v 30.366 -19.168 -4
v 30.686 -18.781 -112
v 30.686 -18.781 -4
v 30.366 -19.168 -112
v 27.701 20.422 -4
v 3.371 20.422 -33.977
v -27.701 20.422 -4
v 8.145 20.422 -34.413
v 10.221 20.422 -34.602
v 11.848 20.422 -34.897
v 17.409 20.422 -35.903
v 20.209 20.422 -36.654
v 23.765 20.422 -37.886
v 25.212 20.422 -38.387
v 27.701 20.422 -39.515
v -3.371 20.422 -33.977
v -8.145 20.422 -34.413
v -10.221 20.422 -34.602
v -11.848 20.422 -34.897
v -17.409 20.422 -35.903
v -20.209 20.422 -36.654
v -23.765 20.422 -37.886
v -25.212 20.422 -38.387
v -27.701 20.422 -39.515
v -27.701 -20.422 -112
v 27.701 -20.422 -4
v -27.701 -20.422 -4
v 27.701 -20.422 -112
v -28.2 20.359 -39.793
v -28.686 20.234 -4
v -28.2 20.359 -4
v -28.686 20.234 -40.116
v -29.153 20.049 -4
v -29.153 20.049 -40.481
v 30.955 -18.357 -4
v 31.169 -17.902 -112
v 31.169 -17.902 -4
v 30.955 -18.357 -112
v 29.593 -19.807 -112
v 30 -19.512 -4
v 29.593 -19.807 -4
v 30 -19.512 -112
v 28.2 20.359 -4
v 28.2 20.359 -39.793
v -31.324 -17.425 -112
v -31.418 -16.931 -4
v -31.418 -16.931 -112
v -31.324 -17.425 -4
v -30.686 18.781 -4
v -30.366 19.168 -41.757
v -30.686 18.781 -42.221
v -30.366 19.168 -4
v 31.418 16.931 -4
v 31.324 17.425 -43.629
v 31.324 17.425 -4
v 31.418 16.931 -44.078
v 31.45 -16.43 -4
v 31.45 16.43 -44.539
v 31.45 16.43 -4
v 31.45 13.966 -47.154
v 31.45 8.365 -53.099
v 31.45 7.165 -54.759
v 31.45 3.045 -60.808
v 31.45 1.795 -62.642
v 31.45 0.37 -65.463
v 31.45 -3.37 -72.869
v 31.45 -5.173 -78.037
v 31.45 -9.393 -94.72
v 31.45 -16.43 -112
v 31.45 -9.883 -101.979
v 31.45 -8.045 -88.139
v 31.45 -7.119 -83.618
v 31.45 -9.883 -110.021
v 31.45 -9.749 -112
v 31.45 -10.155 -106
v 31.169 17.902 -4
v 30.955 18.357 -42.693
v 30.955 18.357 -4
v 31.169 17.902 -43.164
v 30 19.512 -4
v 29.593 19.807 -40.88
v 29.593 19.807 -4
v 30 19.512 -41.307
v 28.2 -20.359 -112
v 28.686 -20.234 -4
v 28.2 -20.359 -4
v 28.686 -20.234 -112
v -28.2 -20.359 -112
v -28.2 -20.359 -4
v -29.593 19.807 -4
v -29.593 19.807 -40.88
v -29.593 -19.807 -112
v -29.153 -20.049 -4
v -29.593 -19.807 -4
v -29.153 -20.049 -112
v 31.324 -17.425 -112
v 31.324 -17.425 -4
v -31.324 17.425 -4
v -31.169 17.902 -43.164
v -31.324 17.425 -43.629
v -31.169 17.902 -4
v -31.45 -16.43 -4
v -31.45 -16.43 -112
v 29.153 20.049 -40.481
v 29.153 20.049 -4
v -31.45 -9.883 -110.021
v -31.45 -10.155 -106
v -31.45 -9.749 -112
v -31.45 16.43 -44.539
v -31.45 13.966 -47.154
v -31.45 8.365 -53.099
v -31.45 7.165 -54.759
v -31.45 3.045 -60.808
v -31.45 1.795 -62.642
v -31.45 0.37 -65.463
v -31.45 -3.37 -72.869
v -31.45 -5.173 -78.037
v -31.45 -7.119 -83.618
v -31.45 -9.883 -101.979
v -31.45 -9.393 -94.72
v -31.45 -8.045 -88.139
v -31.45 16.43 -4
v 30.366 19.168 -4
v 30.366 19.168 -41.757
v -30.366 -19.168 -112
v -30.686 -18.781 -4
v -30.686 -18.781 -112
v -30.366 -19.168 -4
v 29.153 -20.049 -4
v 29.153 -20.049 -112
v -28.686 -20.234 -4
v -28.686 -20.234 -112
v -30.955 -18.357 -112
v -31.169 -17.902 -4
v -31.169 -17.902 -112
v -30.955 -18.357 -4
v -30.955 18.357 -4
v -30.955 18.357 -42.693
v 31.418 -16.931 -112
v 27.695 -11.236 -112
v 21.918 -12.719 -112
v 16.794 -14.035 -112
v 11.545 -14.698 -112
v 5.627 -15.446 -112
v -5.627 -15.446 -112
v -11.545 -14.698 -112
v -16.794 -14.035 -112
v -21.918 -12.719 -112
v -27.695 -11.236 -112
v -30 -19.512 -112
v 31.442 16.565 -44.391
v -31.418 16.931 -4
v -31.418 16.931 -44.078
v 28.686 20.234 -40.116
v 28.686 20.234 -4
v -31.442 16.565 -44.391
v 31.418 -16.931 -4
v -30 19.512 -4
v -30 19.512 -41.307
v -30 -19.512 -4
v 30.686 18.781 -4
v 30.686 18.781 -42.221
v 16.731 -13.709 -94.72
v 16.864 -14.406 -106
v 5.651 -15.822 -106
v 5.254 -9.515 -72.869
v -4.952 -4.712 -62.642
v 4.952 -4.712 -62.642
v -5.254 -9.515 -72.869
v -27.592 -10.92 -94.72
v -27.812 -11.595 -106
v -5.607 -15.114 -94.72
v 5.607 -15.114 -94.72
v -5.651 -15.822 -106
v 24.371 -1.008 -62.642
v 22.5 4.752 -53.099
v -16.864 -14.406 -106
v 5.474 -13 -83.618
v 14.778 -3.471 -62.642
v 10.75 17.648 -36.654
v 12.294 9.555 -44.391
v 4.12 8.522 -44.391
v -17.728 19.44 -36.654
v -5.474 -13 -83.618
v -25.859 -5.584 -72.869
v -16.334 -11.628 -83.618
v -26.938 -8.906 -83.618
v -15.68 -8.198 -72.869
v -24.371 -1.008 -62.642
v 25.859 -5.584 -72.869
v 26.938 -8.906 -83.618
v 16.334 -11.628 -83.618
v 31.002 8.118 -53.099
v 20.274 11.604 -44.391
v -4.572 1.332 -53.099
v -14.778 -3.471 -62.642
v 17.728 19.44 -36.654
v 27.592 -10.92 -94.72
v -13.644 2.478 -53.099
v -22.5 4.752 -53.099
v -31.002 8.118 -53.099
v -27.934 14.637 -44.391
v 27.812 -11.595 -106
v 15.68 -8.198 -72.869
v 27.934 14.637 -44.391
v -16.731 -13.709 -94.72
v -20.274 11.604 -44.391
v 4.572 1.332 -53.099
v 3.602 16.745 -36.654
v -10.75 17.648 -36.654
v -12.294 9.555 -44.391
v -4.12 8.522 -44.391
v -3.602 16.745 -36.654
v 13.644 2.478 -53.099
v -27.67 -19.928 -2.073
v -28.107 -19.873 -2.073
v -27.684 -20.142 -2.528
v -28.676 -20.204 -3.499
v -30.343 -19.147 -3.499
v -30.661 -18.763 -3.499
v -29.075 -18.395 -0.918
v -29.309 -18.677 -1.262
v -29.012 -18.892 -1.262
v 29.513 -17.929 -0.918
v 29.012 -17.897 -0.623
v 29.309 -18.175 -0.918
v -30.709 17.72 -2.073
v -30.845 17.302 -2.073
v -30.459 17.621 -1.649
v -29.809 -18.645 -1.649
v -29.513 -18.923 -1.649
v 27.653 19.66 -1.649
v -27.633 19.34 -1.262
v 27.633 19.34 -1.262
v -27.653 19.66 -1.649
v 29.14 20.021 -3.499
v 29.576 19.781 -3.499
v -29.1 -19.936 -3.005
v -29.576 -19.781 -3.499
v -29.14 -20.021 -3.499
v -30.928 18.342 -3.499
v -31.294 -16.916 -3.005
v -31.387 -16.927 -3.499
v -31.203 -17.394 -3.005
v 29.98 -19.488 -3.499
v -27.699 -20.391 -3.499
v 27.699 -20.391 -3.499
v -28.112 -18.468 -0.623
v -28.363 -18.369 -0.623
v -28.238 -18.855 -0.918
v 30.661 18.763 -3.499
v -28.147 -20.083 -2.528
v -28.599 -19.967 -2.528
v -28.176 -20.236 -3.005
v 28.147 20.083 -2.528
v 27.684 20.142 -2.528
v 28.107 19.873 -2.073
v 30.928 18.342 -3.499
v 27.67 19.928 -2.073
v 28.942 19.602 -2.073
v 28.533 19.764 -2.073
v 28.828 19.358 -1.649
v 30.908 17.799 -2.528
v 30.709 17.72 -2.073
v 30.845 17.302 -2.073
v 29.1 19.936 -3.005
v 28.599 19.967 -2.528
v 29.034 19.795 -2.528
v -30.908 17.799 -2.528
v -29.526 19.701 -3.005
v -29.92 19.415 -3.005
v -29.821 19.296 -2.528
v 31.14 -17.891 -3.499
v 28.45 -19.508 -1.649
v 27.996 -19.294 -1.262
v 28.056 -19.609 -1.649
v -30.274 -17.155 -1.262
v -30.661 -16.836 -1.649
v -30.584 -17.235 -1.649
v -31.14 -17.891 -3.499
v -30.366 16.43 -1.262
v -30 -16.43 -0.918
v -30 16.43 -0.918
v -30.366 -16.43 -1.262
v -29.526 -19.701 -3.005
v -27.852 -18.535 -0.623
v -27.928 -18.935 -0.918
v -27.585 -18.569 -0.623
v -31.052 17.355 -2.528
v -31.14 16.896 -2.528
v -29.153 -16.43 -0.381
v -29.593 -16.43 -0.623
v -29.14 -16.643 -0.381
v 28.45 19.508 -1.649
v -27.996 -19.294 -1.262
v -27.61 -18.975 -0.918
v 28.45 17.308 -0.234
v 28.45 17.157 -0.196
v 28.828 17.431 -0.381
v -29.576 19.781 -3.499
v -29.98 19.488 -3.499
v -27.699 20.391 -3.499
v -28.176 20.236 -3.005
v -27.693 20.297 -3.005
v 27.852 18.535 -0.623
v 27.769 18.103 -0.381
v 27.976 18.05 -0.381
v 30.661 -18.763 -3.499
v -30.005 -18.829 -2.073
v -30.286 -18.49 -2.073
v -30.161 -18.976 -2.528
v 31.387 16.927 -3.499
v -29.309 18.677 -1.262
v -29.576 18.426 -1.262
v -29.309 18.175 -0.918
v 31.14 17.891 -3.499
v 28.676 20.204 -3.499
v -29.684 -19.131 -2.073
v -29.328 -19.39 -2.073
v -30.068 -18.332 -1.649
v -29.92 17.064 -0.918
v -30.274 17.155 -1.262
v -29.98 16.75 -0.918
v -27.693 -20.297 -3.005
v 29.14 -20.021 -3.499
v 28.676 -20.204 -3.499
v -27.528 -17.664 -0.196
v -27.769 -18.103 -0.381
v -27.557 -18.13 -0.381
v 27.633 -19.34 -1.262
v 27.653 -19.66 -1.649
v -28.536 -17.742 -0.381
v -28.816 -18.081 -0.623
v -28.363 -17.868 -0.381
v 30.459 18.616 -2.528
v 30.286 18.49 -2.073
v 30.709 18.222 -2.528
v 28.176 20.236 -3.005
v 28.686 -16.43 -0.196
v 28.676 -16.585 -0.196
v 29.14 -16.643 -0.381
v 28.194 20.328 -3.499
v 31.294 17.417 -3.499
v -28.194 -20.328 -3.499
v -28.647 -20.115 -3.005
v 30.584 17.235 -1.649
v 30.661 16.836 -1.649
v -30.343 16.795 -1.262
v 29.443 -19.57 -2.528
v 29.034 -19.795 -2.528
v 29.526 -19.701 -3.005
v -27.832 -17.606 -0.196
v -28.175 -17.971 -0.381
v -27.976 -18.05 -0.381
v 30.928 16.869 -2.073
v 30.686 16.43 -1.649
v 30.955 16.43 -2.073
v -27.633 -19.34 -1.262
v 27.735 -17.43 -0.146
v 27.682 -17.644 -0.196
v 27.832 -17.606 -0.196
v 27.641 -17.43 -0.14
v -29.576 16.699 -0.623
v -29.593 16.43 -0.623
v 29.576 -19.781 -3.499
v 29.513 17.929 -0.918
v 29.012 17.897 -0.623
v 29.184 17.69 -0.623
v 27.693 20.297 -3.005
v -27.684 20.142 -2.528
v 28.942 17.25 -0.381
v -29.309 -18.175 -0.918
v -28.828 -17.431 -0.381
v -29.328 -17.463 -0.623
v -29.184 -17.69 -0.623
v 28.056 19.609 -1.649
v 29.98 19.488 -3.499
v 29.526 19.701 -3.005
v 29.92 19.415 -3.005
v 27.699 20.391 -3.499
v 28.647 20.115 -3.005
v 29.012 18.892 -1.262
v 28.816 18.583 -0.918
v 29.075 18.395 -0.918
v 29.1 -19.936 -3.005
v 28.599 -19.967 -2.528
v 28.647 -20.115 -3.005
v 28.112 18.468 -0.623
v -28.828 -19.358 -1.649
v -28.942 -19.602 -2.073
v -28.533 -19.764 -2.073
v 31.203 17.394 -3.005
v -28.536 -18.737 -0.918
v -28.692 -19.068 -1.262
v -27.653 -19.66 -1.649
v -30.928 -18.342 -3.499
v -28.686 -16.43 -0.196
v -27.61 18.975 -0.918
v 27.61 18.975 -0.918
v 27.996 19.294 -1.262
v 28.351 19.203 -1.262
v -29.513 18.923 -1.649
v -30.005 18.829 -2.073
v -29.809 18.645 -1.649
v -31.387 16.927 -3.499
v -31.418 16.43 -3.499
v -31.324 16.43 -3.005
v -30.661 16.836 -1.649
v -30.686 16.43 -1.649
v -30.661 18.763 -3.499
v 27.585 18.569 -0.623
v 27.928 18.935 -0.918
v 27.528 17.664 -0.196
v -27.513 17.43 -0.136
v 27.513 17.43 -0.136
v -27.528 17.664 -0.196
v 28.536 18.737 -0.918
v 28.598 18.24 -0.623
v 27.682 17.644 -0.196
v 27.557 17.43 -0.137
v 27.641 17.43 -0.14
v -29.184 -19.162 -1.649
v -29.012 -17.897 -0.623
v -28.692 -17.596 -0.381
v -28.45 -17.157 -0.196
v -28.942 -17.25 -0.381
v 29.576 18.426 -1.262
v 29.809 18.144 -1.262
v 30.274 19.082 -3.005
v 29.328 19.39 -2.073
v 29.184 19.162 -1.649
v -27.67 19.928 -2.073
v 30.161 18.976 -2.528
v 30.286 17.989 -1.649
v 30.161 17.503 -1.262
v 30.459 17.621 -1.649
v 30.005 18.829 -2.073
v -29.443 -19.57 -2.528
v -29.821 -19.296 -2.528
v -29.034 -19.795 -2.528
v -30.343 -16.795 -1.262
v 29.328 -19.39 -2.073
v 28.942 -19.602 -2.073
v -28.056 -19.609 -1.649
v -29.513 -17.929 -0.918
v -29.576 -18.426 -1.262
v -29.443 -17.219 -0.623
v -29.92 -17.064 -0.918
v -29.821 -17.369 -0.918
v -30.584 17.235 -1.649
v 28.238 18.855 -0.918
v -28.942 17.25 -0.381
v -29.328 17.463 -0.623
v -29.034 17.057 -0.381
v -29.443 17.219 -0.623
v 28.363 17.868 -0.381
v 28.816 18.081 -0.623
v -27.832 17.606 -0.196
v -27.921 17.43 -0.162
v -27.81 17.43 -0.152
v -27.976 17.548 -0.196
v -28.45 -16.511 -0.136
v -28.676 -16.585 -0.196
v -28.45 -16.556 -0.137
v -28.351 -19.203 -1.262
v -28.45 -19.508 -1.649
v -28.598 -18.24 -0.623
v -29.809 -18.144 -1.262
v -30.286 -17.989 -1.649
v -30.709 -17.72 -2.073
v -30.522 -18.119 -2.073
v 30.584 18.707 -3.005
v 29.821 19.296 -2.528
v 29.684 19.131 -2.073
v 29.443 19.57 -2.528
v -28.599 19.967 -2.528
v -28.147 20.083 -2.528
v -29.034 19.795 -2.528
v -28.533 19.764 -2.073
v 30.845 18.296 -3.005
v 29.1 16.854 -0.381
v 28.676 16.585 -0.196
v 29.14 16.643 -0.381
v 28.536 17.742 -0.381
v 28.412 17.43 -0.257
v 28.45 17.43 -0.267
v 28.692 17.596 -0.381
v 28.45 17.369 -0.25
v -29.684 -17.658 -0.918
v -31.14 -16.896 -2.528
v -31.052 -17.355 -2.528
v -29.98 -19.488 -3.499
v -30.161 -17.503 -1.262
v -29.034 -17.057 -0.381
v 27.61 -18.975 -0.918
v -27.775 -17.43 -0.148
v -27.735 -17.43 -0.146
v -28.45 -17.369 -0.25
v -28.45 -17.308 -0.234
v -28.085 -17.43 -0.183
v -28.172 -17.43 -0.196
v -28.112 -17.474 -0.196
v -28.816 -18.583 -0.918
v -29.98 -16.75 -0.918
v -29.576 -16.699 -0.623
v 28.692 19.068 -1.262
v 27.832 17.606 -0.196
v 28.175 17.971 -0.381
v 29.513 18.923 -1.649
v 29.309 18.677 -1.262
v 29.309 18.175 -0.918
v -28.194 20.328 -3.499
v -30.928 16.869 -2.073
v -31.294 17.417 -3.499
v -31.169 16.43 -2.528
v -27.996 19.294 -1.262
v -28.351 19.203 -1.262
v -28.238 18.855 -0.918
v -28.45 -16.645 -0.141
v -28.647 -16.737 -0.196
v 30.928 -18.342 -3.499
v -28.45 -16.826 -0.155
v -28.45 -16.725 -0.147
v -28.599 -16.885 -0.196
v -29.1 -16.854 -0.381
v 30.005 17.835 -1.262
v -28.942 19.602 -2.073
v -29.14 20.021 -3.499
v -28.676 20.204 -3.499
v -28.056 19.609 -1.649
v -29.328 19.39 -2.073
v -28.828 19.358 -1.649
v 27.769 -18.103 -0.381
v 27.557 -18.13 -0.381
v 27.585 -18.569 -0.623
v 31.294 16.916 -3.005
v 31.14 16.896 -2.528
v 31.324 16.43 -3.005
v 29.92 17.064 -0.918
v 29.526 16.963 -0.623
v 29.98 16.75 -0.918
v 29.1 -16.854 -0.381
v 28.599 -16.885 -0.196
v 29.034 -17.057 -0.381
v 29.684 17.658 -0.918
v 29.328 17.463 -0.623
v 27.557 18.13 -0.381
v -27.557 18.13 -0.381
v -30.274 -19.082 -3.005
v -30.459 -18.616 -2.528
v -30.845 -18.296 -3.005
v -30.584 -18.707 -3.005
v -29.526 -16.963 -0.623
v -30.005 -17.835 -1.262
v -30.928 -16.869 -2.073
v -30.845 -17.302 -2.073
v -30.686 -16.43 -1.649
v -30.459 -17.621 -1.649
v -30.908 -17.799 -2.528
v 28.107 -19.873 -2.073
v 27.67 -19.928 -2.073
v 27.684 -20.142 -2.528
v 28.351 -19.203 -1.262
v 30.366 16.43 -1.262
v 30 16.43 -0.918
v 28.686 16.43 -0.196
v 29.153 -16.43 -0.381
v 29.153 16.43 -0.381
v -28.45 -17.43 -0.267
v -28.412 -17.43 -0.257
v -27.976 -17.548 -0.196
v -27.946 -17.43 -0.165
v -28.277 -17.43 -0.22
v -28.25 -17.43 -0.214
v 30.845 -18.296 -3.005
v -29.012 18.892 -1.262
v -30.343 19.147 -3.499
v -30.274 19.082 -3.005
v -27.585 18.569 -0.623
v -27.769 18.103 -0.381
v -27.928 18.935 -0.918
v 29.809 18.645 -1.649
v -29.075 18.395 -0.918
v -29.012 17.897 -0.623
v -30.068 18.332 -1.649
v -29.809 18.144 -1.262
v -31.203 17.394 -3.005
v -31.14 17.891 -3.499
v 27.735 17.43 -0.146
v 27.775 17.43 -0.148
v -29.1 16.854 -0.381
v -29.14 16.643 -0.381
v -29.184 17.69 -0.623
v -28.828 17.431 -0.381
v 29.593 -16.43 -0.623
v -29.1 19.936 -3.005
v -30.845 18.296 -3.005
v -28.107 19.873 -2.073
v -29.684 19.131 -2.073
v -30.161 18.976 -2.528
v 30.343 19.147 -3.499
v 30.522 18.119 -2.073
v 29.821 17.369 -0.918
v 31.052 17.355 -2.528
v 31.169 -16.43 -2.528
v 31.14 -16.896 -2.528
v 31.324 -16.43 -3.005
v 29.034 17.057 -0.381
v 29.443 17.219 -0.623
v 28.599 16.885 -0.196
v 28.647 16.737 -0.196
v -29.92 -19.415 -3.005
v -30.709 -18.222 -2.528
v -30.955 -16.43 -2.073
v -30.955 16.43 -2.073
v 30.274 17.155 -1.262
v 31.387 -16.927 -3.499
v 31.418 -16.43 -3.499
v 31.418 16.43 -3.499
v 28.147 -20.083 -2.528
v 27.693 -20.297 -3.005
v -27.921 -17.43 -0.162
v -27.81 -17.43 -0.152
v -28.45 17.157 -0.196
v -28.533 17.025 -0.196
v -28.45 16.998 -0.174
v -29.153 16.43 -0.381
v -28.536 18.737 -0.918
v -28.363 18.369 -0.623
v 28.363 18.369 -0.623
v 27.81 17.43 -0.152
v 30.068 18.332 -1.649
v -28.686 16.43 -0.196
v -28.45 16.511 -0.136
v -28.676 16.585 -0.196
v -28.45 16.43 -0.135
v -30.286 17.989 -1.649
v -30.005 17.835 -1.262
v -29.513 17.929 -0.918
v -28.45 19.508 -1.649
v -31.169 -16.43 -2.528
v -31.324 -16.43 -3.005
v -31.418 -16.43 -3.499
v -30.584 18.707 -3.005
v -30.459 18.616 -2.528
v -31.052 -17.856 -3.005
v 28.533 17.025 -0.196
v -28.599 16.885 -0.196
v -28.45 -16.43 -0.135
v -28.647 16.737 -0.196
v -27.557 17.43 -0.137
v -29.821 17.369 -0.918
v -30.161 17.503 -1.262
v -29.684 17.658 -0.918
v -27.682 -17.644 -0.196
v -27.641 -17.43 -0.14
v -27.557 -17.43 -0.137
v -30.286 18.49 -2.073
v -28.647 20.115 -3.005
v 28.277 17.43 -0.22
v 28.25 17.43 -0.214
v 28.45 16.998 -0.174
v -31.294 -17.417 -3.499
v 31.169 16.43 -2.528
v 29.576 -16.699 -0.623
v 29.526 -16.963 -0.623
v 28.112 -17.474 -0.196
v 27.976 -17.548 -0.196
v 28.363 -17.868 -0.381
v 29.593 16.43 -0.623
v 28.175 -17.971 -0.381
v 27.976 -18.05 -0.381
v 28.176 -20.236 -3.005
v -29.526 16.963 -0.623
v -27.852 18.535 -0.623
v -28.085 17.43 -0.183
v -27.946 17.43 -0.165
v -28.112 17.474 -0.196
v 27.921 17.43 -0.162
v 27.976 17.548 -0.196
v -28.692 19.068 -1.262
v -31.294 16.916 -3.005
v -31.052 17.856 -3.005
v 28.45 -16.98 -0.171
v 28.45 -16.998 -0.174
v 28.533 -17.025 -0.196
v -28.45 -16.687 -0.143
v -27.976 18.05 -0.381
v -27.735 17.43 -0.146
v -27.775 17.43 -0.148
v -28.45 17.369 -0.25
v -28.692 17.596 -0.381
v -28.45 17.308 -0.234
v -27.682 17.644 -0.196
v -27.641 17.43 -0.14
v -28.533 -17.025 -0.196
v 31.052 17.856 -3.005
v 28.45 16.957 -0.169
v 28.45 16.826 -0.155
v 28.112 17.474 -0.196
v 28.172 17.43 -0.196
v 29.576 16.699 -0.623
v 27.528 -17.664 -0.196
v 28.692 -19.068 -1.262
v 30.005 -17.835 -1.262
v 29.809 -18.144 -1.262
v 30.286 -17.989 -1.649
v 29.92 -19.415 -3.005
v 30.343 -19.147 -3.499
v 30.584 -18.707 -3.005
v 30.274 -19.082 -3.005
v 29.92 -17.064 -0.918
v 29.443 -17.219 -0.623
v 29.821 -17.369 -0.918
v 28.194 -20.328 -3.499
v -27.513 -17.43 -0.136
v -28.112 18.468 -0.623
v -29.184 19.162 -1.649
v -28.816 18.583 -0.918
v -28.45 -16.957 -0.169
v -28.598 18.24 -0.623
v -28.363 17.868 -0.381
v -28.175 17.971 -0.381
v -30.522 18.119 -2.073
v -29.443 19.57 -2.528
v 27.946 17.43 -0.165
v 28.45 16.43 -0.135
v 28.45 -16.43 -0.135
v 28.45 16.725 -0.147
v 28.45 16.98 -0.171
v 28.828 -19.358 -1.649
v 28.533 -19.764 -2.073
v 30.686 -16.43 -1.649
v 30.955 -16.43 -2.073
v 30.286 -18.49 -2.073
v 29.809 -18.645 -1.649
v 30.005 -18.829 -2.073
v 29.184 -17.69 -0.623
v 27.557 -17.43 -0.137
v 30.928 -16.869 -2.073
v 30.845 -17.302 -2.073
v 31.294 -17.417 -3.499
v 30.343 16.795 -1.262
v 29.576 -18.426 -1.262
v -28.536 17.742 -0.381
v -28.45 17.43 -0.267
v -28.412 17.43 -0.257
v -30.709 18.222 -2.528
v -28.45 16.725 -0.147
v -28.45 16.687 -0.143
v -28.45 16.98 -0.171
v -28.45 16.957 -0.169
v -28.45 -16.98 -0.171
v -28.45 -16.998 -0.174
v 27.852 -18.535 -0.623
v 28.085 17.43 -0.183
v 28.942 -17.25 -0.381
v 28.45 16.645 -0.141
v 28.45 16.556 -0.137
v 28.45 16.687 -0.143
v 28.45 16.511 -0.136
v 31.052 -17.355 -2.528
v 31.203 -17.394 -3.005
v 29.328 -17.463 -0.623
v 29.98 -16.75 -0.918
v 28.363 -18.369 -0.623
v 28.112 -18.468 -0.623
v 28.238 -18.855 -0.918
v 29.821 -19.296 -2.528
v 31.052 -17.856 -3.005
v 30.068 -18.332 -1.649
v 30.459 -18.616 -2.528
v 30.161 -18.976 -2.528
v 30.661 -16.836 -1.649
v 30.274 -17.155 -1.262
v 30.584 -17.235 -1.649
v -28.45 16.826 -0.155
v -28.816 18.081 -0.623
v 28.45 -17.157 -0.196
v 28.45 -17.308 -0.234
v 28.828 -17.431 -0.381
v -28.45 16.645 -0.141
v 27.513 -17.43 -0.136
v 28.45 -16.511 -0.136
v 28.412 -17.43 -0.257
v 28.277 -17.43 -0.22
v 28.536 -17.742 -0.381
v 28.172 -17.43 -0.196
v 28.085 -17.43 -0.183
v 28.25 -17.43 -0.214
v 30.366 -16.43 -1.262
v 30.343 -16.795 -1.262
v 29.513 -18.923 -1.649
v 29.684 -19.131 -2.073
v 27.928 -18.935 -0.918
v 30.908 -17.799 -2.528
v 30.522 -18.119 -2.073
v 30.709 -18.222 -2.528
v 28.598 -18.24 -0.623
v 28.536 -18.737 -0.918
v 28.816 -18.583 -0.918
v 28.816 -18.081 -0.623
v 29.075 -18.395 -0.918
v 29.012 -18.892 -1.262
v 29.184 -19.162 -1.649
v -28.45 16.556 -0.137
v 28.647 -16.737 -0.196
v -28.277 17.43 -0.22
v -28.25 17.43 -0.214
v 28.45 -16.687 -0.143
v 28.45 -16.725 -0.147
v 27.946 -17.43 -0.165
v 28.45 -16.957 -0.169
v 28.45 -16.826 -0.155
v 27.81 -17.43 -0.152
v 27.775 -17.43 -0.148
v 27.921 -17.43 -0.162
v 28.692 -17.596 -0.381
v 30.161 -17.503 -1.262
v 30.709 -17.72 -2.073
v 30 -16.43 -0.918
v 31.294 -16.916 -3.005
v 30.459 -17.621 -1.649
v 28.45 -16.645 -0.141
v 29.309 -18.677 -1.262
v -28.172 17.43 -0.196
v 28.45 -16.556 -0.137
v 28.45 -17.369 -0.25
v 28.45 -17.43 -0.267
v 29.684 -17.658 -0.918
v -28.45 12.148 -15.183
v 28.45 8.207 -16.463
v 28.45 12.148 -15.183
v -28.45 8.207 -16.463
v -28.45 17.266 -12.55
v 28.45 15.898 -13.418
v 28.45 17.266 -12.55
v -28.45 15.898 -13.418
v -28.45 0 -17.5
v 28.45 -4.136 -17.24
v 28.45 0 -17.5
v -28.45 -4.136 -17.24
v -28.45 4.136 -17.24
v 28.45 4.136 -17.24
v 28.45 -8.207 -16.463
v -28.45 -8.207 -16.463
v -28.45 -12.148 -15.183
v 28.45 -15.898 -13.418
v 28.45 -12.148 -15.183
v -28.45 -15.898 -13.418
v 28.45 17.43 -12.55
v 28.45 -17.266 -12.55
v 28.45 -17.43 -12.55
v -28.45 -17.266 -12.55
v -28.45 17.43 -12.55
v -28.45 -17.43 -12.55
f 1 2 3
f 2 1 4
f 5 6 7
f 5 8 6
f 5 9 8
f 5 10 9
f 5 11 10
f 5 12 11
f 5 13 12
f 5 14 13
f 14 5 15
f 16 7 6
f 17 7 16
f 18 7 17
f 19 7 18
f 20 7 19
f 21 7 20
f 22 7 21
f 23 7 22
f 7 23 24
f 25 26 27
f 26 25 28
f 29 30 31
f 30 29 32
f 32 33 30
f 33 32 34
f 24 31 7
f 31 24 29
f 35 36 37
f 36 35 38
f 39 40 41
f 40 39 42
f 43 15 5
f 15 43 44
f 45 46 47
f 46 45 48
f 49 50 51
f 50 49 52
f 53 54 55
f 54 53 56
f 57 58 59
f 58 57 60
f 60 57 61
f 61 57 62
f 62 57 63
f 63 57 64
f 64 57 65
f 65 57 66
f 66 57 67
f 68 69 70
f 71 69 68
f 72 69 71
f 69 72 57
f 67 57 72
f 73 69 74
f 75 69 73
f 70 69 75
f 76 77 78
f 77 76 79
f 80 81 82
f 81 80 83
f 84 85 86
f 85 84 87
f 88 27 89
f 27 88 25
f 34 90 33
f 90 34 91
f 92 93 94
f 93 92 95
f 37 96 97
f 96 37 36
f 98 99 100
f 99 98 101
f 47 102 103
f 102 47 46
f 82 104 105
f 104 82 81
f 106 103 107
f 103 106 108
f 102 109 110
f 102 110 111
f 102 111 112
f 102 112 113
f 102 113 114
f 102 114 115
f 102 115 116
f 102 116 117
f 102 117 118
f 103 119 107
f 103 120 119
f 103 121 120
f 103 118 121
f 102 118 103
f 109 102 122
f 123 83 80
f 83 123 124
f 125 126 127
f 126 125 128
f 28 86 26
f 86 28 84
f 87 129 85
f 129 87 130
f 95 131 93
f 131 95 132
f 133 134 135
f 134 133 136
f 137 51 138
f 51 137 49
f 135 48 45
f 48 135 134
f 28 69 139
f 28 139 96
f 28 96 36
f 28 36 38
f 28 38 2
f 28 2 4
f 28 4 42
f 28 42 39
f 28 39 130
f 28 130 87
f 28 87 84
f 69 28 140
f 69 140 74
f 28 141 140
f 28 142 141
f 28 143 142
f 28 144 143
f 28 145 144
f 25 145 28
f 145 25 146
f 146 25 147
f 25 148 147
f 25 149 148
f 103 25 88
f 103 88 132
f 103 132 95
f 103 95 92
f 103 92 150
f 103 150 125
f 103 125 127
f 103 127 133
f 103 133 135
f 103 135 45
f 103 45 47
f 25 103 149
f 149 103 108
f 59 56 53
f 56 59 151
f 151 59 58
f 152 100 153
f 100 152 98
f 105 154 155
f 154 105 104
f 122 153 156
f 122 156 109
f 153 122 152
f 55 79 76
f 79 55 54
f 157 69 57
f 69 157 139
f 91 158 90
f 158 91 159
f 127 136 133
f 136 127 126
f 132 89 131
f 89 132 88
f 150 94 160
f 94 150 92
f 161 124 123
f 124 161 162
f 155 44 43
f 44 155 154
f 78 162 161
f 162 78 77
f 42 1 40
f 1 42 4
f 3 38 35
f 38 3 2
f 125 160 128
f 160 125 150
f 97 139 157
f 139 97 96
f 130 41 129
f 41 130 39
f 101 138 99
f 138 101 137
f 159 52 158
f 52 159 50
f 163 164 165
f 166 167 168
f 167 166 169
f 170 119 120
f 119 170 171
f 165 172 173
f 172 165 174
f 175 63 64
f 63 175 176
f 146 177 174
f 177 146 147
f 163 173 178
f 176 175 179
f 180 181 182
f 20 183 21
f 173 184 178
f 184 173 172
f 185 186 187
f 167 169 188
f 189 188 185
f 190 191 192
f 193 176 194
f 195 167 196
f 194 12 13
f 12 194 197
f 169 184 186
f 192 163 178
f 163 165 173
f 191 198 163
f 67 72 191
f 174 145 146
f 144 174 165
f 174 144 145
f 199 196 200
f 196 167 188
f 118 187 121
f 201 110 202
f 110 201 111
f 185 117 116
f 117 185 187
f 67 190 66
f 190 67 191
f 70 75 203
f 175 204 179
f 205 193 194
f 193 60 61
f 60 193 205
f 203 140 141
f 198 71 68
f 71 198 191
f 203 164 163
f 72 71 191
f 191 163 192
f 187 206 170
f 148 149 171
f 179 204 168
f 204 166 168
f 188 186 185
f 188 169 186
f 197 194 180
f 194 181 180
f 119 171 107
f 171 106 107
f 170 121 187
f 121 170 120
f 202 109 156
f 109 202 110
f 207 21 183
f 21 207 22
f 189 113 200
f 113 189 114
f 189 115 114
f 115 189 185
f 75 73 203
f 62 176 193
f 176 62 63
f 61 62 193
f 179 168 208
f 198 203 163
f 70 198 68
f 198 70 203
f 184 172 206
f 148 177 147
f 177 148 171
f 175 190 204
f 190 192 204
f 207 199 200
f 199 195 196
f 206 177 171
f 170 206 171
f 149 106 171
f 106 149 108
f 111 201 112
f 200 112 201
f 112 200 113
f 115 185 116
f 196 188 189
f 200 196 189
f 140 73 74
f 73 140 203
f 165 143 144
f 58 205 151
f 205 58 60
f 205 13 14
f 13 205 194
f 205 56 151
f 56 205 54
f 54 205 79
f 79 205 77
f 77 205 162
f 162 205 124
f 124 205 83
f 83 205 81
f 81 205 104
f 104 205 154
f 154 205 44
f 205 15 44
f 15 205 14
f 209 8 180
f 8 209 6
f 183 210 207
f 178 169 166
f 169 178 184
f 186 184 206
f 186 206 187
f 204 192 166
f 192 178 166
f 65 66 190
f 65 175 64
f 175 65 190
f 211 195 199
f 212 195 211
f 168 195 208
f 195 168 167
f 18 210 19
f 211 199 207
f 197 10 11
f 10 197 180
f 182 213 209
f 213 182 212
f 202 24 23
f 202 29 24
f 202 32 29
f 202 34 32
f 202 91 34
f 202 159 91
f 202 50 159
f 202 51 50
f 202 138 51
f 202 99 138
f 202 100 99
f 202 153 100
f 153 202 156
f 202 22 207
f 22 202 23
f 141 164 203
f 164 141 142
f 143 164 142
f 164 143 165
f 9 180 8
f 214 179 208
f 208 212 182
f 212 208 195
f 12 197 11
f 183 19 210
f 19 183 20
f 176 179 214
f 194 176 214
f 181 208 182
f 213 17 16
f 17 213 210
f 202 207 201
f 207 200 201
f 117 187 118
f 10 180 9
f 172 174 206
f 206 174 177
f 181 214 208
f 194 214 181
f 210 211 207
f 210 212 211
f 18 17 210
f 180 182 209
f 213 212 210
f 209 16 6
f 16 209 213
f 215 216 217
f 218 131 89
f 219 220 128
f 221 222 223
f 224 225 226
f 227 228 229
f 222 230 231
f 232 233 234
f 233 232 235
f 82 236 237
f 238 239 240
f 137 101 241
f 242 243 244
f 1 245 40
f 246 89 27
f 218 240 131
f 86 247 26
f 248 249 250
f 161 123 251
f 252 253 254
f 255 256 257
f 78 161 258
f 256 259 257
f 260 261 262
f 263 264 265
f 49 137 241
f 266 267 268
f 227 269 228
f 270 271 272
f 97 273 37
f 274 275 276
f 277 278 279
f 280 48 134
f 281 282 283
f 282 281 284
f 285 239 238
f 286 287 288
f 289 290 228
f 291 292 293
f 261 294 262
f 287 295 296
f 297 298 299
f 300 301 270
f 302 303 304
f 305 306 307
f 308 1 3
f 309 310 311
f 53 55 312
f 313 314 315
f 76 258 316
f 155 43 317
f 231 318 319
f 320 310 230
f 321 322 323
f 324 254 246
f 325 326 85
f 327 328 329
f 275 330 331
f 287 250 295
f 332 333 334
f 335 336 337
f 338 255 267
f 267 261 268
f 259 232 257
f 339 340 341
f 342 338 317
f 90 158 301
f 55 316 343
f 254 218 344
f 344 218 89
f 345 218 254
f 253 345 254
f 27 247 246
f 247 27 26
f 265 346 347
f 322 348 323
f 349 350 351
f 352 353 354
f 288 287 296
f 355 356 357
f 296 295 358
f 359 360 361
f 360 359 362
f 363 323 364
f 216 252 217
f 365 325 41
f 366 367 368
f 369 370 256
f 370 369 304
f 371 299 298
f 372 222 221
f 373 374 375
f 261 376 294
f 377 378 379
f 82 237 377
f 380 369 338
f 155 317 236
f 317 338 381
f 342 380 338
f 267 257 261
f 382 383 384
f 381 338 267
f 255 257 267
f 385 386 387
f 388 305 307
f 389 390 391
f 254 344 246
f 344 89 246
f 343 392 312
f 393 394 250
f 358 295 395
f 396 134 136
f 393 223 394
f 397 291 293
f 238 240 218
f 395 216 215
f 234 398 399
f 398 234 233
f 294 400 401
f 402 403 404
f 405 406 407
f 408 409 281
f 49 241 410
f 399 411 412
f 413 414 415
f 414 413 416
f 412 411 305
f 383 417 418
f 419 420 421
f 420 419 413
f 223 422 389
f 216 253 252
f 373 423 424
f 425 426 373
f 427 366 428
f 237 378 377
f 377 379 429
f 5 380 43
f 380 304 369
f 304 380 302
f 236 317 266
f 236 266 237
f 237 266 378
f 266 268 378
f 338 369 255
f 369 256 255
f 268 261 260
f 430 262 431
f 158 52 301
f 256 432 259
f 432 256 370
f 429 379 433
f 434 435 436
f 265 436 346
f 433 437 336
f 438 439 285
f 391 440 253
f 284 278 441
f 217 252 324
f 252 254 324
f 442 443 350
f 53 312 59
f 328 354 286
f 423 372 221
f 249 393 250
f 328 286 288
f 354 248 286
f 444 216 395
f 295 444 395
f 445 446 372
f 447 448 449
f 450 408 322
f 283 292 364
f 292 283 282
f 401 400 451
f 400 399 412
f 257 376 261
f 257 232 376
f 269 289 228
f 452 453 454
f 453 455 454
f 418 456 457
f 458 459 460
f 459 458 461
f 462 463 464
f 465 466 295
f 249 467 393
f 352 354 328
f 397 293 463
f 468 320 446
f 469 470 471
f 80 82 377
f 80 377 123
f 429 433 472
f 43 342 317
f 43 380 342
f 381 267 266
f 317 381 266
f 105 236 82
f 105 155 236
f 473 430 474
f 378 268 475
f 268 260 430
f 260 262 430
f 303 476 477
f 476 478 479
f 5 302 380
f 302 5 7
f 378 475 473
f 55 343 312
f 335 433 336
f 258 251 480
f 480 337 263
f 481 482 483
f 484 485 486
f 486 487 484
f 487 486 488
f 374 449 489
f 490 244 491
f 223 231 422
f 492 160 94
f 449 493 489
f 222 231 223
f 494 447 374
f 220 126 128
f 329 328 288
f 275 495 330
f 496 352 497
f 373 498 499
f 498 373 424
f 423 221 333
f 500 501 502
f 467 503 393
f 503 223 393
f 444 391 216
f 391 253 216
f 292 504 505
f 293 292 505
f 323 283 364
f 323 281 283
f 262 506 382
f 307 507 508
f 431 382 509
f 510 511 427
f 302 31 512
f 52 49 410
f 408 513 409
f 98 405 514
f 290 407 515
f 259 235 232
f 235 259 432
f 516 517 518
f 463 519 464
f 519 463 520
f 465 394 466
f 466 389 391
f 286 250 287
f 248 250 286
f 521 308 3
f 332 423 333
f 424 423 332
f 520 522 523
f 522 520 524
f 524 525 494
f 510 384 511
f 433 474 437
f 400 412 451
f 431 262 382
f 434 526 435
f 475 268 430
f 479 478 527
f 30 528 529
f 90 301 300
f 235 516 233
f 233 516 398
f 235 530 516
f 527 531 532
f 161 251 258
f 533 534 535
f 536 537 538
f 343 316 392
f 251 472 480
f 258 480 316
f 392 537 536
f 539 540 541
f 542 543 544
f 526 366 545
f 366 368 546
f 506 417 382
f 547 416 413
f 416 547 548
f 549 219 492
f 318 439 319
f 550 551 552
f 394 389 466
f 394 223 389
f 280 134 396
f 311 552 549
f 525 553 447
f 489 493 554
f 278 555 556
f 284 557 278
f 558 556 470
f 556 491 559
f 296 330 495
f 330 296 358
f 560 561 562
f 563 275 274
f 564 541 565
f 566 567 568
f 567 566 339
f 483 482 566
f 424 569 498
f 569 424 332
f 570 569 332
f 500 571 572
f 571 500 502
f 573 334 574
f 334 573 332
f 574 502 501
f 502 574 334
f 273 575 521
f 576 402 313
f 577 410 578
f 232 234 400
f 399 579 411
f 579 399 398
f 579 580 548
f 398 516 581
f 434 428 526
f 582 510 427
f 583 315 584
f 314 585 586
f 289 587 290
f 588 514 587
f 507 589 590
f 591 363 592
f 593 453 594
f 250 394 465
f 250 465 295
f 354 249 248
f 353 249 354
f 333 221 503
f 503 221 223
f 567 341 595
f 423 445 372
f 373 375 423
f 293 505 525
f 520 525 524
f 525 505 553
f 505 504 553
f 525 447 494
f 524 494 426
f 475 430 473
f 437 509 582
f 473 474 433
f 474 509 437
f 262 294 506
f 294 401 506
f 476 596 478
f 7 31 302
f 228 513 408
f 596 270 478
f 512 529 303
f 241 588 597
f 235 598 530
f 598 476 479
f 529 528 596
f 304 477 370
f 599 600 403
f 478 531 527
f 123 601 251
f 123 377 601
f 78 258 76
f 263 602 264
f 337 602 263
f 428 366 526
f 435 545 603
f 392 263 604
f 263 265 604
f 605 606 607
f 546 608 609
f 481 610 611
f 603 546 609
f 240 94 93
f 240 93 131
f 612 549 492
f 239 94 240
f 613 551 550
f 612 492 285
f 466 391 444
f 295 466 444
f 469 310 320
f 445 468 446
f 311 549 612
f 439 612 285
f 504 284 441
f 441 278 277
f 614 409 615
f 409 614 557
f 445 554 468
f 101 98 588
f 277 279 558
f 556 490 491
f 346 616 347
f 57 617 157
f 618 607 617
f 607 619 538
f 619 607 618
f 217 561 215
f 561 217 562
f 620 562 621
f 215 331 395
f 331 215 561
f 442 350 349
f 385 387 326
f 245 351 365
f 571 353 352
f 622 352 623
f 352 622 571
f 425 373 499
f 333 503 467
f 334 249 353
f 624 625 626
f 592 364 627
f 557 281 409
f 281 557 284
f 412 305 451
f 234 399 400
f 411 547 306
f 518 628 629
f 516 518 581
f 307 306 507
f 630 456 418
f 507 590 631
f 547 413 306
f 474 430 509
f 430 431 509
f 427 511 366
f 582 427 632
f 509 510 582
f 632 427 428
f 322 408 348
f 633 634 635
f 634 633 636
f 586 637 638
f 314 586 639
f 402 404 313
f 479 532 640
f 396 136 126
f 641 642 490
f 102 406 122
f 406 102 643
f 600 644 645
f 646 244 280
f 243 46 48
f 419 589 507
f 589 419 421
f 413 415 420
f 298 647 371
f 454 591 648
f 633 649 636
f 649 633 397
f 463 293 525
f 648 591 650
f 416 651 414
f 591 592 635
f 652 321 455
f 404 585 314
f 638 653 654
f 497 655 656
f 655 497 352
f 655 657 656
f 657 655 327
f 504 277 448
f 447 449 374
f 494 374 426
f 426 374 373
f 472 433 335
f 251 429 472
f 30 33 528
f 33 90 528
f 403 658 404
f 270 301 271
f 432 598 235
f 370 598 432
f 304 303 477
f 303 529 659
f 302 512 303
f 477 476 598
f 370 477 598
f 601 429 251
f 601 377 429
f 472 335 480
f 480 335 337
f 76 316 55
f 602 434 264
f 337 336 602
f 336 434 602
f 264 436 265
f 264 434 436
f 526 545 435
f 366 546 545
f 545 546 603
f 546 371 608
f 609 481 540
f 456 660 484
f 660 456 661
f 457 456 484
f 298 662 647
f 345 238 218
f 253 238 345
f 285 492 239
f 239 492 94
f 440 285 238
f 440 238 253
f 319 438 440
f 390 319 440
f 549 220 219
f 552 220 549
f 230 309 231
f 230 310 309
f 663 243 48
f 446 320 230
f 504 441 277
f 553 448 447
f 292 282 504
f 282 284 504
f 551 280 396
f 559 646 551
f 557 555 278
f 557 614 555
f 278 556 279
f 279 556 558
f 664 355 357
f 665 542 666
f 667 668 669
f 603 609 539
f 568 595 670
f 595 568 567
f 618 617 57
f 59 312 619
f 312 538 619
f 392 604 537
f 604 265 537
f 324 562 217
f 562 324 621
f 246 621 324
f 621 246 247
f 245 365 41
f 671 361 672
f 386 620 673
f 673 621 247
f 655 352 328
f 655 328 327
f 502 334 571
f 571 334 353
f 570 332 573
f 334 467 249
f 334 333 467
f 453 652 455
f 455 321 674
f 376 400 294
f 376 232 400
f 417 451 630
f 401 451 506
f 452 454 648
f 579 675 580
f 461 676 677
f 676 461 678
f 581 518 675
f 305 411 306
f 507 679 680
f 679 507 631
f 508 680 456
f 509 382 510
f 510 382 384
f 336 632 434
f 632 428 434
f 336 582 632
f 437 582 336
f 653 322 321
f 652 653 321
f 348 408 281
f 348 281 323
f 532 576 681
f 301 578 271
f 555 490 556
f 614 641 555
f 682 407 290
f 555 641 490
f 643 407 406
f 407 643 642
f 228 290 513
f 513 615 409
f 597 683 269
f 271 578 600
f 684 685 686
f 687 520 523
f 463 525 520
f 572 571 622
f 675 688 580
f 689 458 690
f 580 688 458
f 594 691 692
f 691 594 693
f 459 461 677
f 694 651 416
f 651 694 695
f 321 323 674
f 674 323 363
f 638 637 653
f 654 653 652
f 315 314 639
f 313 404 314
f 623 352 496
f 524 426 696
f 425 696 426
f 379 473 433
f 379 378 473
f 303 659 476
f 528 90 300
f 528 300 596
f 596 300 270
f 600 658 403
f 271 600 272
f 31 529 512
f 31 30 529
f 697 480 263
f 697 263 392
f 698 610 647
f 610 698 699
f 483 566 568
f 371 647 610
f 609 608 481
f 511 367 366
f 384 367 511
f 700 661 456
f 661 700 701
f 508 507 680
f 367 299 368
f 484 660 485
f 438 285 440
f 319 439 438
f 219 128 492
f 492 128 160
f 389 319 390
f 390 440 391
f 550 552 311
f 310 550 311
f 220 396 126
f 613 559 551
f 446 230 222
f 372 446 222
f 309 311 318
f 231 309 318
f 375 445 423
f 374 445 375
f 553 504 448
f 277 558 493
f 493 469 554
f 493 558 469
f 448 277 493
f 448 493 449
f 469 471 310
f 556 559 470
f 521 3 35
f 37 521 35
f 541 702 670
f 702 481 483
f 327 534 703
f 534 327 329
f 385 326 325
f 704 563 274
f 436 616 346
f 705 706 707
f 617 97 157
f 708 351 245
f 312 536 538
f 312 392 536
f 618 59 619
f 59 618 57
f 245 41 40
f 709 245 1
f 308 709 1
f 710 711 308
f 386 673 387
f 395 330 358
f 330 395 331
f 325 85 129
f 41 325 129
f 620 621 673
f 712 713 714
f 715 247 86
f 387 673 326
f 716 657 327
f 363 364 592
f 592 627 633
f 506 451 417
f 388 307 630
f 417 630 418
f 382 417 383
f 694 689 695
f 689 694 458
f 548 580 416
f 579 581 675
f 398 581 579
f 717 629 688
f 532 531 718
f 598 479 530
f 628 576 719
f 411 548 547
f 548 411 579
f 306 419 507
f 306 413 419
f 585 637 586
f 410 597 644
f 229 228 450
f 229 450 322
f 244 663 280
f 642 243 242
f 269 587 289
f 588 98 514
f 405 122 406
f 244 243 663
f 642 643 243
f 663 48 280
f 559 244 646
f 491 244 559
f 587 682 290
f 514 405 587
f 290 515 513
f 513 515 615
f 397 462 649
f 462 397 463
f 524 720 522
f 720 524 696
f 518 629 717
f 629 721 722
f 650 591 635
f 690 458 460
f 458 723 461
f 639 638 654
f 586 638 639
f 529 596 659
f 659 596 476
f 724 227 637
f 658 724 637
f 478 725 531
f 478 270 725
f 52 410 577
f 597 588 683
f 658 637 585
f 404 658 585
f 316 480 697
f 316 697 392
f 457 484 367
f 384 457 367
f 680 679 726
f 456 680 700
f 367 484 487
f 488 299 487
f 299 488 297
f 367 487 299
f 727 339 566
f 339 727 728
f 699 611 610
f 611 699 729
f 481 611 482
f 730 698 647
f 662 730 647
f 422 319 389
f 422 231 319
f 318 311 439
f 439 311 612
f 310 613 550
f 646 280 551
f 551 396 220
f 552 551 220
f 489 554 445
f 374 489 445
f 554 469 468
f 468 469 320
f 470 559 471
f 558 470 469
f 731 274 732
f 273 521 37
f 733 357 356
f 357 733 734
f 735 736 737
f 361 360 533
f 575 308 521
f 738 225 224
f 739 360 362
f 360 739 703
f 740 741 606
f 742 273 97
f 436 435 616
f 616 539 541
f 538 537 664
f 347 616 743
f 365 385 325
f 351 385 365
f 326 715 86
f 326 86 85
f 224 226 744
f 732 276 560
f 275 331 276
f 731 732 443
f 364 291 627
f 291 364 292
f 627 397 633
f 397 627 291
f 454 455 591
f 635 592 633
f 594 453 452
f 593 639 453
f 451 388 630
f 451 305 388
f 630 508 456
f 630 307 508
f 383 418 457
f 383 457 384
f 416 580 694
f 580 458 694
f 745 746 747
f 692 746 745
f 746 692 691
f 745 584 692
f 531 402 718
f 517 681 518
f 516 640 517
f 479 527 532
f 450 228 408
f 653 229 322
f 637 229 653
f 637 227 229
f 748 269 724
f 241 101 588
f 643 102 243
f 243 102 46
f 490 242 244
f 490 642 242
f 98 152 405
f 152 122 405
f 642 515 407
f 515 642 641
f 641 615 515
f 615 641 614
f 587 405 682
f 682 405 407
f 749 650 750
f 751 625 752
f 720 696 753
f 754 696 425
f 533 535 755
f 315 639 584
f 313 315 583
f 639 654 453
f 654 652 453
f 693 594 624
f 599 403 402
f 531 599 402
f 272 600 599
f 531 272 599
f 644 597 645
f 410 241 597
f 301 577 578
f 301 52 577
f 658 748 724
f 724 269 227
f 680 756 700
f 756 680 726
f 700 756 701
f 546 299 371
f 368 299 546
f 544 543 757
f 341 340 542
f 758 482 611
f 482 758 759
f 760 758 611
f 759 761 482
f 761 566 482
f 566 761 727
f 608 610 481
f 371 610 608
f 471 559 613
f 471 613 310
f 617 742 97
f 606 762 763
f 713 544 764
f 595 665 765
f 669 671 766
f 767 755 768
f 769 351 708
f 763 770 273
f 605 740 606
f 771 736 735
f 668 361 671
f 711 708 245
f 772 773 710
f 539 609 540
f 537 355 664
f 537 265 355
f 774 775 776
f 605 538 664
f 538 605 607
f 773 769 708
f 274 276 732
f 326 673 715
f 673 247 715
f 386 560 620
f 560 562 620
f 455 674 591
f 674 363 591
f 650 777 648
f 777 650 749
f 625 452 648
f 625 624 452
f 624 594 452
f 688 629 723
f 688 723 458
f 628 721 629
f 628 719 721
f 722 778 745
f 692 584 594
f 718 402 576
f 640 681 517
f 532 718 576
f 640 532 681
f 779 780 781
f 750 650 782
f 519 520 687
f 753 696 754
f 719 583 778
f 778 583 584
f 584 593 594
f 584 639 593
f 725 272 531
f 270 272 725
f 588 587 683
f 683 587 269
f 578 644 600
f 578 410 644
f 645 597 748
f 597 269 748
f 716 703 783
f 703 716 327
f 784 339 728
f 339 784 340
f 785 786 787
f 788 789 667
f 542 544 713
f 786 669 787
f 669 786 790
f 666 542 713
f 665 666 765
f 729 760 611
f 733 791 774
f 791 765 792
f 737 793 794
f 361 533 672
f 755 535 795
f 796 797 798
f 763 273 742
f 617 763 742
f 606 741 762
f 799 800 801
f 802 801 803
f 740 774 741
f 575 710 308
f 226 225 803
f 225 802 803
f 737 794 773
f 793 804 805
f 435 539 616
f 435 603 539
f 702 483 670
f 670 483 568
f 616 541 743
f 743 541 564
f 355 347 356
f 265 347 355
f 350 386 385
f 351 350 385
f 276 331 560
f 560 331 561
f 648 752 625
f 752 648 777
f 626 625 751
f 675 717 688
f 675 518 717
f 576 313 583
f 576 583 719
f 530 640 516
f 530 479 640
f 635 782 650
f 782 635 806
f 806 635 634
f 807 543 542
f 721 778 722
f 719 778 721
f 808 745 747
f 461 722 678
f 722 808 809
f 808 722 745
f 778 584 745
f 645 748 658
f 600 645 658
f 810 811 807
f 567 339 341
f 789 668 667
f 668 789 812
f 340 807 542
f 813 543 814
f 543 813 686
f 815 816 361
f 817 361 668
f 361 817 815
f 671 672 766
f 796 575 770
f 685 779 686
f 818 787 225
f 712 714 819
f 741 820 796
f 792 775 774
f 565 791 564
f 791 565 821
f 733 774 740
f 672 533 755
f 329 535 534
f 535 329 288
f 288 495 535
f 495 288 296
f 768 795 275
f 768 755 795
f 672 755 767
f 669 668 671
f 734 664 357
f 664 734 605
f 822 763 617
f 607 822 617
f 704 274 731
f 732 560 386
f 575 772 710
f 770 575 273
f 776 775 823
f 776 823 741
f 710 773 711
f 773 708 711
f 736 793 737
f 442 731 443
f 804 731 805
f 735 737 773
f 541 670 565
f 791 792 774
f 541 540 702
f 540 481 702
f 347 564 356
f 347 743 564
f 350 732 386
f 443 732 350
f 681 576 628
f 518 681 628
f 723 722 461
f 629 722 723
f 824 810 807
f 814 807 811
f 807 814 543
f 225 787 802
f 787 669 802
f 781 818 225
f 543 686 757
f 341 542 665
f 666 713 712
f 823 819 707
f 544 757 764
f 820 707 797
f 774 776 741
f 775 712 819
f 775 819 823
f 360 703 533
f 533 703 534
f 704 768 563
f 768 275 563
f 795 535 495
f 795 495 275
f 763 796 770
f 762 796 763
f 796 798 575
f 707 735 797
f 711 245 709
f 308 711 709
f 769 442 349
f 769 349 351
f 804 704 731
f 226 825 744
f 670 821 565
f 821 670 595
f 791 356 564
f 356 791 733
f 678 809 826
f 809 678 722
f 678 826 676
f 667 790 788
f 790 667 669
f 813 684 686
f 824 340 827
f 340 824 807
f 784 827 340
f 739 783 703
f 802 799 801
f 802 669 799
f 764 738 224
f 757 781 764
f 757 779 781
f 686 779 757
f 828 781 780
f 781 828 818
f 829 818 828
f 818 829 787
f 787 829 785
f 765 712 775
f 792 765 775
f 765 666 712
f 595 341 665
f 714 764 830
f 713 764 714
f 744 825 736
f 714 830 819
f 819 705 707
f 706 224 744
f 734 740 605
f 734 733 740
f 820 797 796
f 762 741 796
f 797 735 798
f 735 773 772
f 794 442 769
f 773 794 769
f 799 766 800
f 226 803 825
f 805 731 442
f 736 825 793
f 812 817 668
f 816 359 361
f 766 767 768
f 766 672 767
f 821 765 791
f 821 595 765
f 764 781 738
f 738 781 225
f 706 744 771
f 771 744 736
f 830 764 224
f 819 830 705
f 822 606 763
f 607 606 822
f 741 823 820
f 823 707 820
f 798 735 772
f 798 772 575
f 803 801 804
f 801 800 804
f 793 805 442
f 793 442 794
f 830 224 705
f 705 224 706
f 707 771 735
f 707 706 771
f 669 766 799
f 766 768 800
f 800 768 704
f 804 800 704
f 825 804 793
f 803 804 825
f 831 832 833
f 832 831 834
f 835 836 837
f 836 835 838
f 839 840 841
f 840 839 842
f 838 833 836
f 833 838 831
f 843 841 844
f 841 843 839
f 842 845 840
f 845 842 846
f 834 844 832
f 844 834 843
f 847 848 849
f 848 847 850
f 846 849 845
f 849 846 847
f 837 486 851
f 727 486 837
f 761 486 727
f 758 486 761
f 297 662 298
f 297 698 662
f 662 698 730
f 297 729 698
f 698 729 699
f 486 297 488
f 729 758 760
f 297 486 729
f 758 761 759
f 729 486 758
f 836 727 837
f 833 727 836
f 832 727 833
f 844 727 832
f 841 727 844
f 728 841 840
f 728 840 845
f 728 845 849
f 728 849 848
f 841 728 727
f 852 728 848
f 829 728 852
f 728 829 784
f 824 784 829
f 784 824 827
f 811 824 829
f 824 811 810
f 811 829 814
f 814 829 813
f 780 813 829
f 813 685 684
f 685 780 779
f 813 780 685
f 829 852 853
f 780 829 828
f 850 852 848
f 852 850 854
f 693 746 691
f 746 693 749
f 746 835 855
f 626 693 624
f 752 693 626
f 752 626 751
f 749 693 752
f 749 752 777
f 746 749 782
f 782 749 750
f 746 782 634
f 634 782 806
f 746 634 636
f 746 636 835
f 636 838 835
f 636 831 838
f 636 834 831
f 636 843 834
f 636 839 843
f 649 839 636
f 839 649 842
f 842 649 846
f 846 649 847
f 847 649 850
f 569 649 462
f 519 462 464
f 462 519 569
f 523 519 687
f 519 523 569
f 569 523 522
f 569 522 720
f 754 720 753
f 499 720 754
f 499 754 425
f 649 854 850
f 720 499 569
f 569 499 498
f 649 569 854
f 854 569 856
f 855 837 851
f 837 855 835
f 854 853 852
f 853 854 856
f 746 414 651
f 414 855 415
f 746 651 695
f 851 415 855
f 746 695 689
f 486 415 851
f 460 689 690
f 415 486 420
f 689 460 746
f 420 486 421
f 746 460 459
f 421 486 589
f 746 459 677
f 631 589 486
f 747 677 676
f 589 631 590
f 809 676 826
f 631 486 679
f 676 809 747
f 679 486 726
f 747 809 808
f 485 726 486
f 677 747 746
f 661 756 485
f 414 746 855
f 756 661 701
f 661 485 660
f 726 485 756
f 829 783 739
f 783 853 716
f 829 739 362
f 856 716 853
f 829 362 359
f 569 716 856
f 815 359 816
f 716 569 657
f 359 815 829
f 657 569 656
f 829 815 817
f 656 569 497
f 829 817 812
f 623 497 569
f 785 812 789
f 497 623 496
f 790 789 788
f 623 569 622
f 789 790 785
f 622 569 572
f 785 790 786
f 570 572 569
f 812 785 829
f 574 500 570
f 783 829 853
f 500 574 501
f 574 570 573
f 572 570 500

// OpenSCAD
// file: rodel_wheel_adapter.scad
$fn=50;
total_height=39;
//total_height=20;
printer_tolerance = 0.2;
wall_thickness = 4;
rodel_end_inside_length = 35;
wheel_base_and_rodel_end_overlap_length = 20;
//rodel_end_inside_length = 20;
//wheel_base_and_rodel_end_overlap_length = 1;
wheel_base_width = 42;
//wheel_base_width = 38;

assert(rodel_end_inside_length>wheel_base_and_rodel_end_overlap_length);
assert(rodel_end_inside_length<total_height);
rodel_end_width = 14.6;
rodel_end_length = 30.2;
rodel_end_radius = 25;
corner_radius = 4;

wheel_base_height = total_height-rodel_end_inside_length+wheel_base_and_rodel_end_overlap_length;
echo(wheel_base_height);

module cylinder_hat(cylinder_h, radius){
	cylinder_h = 1;
	translate([0,0,0.5*cylinder_h - (cylinder_h+radius)/2]){
			cylinder(r=radius, h=cylinder_h, center=true);
			translate([0,0,cylinder_h/2])
			half_sphere(radius=radius);
	}
}

module base_rounded(corner_r, l, w, h)
{
	minkowski() {
		cyl_h = 1;
		cylinder_hat(cylinder_h=cyl_h, radius=corner_r);
		hat_h = cyl_h + corner_r;
		//cylinder(r=corner_r, h=cyl_h, center=true);
		cube([l-2*corner_r,w-2*corner_r,h-hat_h], true);
		}

}

module base(corner_r, l, w, h)
{
	minkowski() {
                       cyl_h = 1;
                       cylinder(r=corner_r, h=cyl_h, center=true);
            	       cube([l-2*corner_r,w-2*corner_r,h-cyl_h], true);
}
}

//translate([40,0,0])
//base();

module half_sphere(radius)
{
 difference() {
  sphere(r=radius);
  translate([0,0, -radius]) cube(2*radius, center=true);
}
}

module tougue_shape(radius, l, w, h)
{
intersection() {
        cube([l, w, h], true);
        sphere(radius);
        }
}

//base_rounded(corner_radius);

//cylinder_hat(cylinder_h=1, radius=4);

difference(){
    union(){
        translate([0,0, wheel_base_height/2]) {
		base_rounded(corner_radius, wheel_base_width, wheel_base_width, wheel_base_height);
		//base(corner_radius,wheel_base_width, wheel_base_width, wheel_base_height);
        }
        translate([0,0, total_height/2]) {
	    base_rounded(3, rodel_end_length+wall_thickness+printer_tolerance,rodel_end_width+wall_thickness+printer_tolerance, total_height);
            //cube([rodel_end_length+wall_thickness+printer_tolerance, rodel_end_width+wall_thickness+printer_tolerance, total_height], true);
        }
    }

    translate([0,0,total_height-(rodel_end_inside_length-rodel_end_radius)]) {
        //intersection() {
        //cube([rodel_end_length+printer_tolerance, rodel_end_width+printer_tolerance, 100], true);
        //sphere(rodel_end_radius);
        //}
	tougue_shape(rodel_end_radius, (rodel_end_length+printer_tolerance), (rodel_end_width+printer_tolerance), 100);
    }
}
// main file
use <rodel_wheel_adapter.scad>;

$fn=50;


support_height = 82;
//holder_height = 18.5;
holder_height = 30;
total_height = support_height+holder_height;
rodel_end_height = 18.5;
rodel_round_head_height = 5;

wood_foot_width = 56.9;
wood_foot_height_without_tyre = 30.66;
tyre_height = 34.86-30.66;
rodel_end_radius = 33;

wall_thickness = 3;

difference()
{
	translate([0,0,-holder_height/2])
	union(){
	base_rounded(corner_r=4,l=(wood_foot_width+2*wall_thickness), w=(wood_foot_height_without_tyre + tyre_height+2*wall_thickness),h=holder_height);
	//cube([wood_foot_width+2*wall_thickness, wood_foot_height_without_tyre + tyre_height+2*wall_thickness,holder_height]);


	translate([0,0,-0.5*(holder_height+support_height)])
	{
	difference()
	{
			base(corner_r=4,l=(wood_foot_width+2*wall_thickness), w=(wood_foot_height_without_tyre + tyre_height+2*wall_thickness), h=support_height,center=true);
			translate([0,74, -35])
			{sphere(90);}
		}
	}
	}
	translate([0,0,-0.5*(holder_height-rodel_round_head_height)]) tougue();

}

module tougue()
{
union() {
	h = holder_height - rodel_round_head_height;
	translate([0,0,h*0.5])
        cube([wood_foot_width, wood_foot_height_without_tyre+tyre_height, h+0.1], true);
	translate([0,0,rodel_end_radius-rodel_round_head_height])
	difference(){
		translate([-wood_foot_width/2,0,0]){
			rotate([0,90,0]){
				cylinder(r=rodel_end_radius, wood_foot_width);
			}
		}
		translate([0,0,rodel_round_head_height]){
		cube([wood_foot_width+2,wood_foot_width,rodel_end_radius*2], true);}
		offset = wood_foot_height_without_tyre+tyre_height;
		translate([0,(offset*0.5+wood_foot_width*0.5),0]){
		cube([wood_foot_width+2,wood_foot_width,rodel_end_radius*2], true);}
		translate([0,-(offset*0.5+wood_foot_width*0.5),0]){
		cube([wood_foot_width+2,wood_foot_width,rodel_end_radius*2], true);}

	}
}
}
